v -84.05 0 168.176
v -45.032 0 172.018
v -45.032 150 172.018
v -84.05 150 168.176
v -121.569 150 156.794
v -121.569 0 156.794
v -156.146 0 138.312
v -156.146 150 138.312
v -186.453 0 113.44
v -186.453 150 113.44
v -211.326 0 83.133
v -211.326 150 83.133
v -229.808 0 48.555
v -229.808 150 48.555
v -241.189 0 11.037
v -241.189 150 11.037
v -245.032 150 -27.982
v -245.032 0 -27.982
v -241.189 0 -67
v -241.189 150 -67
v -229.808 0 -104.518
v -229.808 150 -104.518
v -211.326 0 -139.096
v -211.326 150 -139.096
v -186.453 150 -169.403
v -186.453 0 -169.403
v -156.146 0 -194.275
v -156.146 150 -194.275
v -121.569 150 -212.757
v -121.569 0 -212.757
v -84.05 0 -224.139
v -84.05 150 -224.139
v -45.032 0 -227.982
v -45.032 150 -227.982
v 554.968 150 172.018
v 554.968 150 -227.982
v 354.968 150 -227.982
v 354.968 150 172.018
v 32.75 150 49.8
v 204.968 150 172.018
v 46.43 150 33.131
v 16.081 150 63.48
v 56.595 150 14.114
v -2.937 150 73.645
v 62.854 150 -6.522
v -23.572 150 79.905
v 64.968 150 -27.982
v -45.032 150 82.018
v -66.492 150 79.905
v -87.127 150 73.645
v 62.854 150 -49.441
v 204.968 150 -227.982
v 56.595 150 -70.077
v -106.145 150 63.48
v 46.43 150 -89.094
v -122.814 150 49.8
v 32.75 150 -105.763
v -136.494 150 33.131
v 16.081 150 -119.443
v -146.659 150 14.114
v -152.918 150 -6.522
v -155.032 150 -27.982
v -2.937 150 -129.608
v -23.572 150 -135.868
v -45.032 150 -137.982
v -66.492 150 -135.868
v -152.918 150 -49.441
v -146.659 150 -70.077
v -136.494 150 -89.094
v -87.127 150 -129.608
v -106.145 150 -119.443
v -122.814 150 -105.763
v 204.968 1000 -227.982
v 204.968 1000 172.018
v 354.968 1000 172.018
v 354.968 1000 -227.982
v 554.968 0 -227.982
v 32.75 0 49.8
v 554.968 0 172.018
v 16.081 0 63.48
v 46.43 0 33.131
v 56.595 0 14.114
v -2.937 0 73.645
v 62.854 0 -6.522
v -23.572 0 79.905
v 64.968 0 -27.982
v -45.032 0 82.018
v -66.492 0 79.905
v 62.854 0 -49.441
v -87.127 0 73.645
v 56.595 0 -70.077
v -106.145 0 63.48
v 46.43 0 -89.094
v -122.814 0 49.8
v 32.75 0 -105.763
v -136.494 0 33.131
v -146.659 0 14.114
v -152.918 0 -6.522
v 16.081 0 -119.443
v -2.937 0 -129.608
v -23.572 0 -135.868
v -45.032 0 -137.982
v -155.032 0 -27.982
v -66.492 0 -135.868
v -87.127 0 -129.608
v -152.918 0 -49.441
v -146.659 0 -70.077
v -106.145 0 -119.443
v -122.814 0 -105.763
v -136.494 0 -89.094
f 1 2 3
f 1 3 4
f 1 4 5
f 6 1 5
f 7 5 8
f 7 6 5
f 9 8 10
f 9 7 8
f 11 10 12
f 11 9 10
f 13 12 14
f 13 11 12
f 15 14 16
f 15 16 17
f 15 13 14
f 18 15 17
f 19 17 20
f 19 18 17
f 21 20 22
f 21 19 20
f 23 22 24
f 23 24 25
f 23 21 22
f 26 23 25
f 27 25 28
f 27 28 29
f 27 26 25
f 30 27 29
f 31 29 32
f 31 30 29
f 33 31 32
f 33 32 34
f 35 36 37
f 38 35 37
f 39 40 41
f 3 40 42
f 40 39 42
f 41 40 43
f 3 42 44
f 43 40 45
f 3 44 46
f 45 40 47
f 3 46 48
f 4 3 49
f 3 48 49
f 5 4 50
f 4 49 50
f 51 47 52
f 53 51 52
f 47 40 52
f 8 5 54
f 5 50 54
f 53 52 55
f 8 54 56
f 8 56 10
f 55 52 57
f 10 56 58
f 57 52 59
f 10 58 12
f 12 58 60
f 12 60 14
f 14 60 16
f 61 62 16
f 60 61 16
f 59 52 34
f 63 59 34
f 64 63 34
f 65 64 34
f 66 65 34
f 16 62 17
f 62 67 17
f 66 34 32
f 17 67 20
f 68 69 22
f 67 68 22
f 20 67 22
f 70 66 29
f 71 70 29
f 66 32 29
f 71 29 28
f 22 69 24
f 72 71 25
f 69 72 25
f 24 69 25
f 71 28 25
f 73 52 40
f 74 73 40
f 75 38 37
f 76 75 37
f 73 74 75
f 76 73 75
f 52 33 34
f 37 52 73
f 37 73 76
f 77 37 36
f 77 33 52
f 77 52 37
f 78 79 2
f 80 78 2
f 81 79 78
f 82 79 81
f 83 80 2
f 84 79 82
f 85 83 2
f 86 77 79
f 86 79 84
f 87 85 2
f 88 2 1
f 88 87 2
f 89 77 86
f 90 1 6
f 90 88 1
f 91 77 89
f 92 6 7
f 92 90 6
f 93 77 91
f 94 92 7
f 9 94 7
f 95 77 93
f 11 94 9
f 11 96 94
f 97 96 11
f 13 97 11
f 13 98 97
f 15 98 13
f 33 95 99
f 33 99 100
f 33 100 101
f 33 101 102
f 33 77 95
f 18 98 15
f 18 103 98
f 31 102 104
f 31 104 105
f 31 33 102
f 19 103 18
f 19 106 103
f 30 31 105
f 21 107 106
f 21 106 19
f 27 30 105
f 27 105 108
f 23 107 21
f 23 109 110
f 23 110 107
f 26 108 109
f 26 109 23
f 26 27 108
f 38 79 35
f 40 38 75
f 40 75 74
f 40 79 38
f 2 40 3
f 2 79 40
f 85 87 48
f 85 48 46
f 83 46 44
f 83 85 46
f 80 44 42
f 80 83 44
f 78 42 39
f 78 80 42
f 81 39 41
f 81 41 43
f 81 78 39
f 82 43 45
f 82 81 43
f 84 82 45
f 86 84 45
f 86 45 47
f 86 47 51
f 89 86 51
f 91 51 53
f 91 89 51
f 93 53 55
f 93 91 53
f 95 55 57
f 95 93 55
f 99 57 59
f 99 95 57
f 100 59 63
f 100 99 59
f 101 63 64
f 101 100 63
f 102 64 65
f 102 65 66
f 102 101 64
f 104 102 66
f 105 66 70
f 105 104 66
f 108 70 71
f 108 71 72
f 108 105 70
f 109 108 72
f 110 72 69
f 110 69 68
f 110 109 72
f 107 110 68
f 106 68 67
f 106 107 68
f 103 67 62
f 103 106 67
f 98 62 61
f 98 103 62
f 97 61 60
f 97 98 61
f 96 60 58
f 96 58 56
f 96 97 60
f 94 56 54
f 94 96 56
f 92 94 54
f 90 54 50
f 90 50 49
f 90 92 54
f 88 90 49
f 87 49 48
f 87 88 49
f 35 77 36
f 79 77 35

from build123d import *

# Parameters (mm, degrees)
IZIM1_R                     = 110
Y_KSEKLIK_EKSTR_ZYON1_DEPTH = 150
Y_KSEKLIK_EKSTR_ZYON2_DEPTH = 850


with BuildPart() as part:
    # Çizim1 → Yükseklik-Ekstrüzyon1 (new body)
    with BuildSketch(Plane(origin=(0, 0, 0), x_dir=(1, 0, 0), z_dir=(0, 1, 0))):
        with BuildLine():
            Line((-45.031937832, 227.98151627), (554.968062168, 227.98151627))
            Line((554.968062168, 227.98151627), (554.968062168, -172.01848373))
            Line((554.968062168, -172.01848373), (-45.031937832, -172.01848373))
            ThreePointArc((-45.031937832, -172.01848373), (-245.031937832, 27.98151627), (-45.031937832, 227.98151627))
        make_face()
        with Locations(Location((-45.031937832, 27.98151627, 0), (0, 0, 270))):
            Circle(IZIM1_R, mode=Mode.SUBTRACT)
    extrude(amount=Y_KSEKLIK_EKSTR_ZYON1_DEPTH)

    # Çizim4 → Yükseklik-Ekstrüzyon2 (add)
    with BuildSketch(Plane(origin=(0, 150, 0), x_dir=(1, 0, 0), z_dir=(0, 1, 0))):
        Polygon((354.968062168, 27.98151627), (354.968062168, 227.98151627), (204.968062168, 227.98151627), (204.968062168, -172.01848373), (354.968062168, -172.01848373), align=None)
    extrude(amount=Y_KSEKLIK_EKSTR_ZYON2_DEPTH)


solid = part.part
